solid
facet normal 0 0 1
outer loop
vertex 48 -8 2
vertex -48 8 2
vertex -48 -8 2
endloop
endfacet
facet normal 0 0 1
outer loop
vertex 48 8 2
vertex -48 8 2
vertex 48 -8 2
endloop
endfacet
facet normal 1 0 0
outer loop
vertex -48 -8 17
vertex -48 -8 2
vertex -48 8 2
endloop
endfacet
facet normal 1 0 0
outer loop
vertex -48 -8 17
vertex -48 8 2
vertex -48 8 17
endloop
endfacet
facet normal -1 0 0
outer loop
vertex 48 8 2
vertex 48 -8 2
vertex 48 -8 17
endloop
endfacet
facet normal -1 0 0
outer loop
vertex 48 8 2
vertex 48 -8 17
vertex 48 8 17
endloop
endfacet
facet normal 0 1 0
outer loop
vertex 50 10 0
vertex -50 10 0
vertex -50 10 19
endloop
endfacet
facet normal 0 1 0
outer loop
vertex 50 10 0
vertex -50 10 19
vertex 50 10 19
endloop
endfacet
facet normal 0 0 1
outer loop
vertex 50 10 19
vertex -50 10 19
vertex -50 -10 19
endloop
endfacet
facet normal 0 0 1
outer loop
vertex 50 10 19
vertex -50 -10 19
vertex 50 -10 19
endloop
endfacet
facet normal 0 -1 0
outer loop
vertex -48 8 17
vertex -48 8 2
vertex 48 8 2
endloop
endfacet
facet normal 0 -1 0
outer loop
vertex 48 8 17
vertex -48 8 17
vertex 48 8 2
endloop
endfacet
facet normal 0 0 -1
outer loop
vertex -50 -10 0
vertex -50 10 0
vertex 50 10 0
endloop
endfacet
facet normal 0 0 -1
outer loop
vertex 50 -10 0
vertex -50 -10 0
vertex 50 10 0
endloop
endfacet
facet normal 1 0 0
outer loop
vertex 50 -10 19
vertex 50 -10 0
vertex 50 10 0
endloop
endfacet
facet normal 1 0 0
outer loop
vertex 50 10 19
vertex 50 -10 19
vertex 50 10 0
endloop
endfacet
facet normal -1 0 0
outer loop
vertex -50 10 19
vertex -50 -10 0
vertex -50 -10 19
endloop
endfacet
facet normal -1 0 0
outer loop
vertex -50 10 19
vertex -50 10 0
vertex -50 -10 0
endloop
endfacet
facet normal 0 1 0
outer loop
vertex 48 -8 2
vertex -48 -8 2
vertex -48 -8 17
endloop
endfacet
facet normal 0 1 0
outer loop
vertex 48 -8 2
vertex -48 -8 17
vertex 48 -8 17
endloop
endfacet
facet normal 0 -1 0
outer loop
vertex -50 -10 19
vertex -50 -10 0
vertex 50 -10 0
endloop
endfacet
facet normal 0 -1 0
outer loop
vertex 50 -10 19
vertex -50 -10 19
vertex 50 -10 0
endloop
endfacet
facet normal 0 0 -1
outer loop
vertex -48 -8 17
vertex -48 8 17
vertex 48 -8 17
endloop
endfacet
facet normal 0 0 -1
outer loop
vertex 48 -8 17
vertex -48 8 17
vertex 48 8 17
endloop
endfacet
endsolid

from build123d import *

# Parameters (mm, degrees)
SKETCH_1_W      = 100
SKETCH_1_H      = 20
EXTRUDE_1_DEPTH = 19
SKETCH_1_2_W    = 100
SKETCH_1_2_H    = 20
EXTRUDE_2_DEPTH = 19
SHELL_1_T       = -2
SKETCH_2_W      = 15
SKETCH_2_H      = 16
EXTRUDE_3_DEPTH = 2


with BuildPart() as part:
    # 草圖1 → 填料-伸長1 (new body)
    with BuildSketch(Plane.XY):
        Rectangle(SKETCH_1_W, SKETCH_1_H)
    extrude(amount=EXTRUDE_1_DEPTH)

    # 草圖1<2> → 填料-伸長2 (add)
    with BuildSketch(Plane.XY):
        Rectangle(SKETCH_1_2_W, SKETCH_1_2_H)
    extrude(amount=EXTRUDE_2_DEPTH)

    # 薄殼1
    shell_1_openings = [part.faces().sort_by_distance(p)[0] for p in [
        (-50, 0, 9.5),
    ]]
    offset(amount=SHELL_1_T, openings=shell_1_openings, kind=Kind.INTERSECTION)

    # 草圖2 → 填料-伸長3 (add)
    with BuildSketch(Plane.ZY.offset(50)):
        with Locations((9.5, 0)):
            Rectangle(SKETCH_2_W, SKETCH_2_H)
    extrude(amount=-EXTRUDE_3_DEPTH)


solid = part.part
